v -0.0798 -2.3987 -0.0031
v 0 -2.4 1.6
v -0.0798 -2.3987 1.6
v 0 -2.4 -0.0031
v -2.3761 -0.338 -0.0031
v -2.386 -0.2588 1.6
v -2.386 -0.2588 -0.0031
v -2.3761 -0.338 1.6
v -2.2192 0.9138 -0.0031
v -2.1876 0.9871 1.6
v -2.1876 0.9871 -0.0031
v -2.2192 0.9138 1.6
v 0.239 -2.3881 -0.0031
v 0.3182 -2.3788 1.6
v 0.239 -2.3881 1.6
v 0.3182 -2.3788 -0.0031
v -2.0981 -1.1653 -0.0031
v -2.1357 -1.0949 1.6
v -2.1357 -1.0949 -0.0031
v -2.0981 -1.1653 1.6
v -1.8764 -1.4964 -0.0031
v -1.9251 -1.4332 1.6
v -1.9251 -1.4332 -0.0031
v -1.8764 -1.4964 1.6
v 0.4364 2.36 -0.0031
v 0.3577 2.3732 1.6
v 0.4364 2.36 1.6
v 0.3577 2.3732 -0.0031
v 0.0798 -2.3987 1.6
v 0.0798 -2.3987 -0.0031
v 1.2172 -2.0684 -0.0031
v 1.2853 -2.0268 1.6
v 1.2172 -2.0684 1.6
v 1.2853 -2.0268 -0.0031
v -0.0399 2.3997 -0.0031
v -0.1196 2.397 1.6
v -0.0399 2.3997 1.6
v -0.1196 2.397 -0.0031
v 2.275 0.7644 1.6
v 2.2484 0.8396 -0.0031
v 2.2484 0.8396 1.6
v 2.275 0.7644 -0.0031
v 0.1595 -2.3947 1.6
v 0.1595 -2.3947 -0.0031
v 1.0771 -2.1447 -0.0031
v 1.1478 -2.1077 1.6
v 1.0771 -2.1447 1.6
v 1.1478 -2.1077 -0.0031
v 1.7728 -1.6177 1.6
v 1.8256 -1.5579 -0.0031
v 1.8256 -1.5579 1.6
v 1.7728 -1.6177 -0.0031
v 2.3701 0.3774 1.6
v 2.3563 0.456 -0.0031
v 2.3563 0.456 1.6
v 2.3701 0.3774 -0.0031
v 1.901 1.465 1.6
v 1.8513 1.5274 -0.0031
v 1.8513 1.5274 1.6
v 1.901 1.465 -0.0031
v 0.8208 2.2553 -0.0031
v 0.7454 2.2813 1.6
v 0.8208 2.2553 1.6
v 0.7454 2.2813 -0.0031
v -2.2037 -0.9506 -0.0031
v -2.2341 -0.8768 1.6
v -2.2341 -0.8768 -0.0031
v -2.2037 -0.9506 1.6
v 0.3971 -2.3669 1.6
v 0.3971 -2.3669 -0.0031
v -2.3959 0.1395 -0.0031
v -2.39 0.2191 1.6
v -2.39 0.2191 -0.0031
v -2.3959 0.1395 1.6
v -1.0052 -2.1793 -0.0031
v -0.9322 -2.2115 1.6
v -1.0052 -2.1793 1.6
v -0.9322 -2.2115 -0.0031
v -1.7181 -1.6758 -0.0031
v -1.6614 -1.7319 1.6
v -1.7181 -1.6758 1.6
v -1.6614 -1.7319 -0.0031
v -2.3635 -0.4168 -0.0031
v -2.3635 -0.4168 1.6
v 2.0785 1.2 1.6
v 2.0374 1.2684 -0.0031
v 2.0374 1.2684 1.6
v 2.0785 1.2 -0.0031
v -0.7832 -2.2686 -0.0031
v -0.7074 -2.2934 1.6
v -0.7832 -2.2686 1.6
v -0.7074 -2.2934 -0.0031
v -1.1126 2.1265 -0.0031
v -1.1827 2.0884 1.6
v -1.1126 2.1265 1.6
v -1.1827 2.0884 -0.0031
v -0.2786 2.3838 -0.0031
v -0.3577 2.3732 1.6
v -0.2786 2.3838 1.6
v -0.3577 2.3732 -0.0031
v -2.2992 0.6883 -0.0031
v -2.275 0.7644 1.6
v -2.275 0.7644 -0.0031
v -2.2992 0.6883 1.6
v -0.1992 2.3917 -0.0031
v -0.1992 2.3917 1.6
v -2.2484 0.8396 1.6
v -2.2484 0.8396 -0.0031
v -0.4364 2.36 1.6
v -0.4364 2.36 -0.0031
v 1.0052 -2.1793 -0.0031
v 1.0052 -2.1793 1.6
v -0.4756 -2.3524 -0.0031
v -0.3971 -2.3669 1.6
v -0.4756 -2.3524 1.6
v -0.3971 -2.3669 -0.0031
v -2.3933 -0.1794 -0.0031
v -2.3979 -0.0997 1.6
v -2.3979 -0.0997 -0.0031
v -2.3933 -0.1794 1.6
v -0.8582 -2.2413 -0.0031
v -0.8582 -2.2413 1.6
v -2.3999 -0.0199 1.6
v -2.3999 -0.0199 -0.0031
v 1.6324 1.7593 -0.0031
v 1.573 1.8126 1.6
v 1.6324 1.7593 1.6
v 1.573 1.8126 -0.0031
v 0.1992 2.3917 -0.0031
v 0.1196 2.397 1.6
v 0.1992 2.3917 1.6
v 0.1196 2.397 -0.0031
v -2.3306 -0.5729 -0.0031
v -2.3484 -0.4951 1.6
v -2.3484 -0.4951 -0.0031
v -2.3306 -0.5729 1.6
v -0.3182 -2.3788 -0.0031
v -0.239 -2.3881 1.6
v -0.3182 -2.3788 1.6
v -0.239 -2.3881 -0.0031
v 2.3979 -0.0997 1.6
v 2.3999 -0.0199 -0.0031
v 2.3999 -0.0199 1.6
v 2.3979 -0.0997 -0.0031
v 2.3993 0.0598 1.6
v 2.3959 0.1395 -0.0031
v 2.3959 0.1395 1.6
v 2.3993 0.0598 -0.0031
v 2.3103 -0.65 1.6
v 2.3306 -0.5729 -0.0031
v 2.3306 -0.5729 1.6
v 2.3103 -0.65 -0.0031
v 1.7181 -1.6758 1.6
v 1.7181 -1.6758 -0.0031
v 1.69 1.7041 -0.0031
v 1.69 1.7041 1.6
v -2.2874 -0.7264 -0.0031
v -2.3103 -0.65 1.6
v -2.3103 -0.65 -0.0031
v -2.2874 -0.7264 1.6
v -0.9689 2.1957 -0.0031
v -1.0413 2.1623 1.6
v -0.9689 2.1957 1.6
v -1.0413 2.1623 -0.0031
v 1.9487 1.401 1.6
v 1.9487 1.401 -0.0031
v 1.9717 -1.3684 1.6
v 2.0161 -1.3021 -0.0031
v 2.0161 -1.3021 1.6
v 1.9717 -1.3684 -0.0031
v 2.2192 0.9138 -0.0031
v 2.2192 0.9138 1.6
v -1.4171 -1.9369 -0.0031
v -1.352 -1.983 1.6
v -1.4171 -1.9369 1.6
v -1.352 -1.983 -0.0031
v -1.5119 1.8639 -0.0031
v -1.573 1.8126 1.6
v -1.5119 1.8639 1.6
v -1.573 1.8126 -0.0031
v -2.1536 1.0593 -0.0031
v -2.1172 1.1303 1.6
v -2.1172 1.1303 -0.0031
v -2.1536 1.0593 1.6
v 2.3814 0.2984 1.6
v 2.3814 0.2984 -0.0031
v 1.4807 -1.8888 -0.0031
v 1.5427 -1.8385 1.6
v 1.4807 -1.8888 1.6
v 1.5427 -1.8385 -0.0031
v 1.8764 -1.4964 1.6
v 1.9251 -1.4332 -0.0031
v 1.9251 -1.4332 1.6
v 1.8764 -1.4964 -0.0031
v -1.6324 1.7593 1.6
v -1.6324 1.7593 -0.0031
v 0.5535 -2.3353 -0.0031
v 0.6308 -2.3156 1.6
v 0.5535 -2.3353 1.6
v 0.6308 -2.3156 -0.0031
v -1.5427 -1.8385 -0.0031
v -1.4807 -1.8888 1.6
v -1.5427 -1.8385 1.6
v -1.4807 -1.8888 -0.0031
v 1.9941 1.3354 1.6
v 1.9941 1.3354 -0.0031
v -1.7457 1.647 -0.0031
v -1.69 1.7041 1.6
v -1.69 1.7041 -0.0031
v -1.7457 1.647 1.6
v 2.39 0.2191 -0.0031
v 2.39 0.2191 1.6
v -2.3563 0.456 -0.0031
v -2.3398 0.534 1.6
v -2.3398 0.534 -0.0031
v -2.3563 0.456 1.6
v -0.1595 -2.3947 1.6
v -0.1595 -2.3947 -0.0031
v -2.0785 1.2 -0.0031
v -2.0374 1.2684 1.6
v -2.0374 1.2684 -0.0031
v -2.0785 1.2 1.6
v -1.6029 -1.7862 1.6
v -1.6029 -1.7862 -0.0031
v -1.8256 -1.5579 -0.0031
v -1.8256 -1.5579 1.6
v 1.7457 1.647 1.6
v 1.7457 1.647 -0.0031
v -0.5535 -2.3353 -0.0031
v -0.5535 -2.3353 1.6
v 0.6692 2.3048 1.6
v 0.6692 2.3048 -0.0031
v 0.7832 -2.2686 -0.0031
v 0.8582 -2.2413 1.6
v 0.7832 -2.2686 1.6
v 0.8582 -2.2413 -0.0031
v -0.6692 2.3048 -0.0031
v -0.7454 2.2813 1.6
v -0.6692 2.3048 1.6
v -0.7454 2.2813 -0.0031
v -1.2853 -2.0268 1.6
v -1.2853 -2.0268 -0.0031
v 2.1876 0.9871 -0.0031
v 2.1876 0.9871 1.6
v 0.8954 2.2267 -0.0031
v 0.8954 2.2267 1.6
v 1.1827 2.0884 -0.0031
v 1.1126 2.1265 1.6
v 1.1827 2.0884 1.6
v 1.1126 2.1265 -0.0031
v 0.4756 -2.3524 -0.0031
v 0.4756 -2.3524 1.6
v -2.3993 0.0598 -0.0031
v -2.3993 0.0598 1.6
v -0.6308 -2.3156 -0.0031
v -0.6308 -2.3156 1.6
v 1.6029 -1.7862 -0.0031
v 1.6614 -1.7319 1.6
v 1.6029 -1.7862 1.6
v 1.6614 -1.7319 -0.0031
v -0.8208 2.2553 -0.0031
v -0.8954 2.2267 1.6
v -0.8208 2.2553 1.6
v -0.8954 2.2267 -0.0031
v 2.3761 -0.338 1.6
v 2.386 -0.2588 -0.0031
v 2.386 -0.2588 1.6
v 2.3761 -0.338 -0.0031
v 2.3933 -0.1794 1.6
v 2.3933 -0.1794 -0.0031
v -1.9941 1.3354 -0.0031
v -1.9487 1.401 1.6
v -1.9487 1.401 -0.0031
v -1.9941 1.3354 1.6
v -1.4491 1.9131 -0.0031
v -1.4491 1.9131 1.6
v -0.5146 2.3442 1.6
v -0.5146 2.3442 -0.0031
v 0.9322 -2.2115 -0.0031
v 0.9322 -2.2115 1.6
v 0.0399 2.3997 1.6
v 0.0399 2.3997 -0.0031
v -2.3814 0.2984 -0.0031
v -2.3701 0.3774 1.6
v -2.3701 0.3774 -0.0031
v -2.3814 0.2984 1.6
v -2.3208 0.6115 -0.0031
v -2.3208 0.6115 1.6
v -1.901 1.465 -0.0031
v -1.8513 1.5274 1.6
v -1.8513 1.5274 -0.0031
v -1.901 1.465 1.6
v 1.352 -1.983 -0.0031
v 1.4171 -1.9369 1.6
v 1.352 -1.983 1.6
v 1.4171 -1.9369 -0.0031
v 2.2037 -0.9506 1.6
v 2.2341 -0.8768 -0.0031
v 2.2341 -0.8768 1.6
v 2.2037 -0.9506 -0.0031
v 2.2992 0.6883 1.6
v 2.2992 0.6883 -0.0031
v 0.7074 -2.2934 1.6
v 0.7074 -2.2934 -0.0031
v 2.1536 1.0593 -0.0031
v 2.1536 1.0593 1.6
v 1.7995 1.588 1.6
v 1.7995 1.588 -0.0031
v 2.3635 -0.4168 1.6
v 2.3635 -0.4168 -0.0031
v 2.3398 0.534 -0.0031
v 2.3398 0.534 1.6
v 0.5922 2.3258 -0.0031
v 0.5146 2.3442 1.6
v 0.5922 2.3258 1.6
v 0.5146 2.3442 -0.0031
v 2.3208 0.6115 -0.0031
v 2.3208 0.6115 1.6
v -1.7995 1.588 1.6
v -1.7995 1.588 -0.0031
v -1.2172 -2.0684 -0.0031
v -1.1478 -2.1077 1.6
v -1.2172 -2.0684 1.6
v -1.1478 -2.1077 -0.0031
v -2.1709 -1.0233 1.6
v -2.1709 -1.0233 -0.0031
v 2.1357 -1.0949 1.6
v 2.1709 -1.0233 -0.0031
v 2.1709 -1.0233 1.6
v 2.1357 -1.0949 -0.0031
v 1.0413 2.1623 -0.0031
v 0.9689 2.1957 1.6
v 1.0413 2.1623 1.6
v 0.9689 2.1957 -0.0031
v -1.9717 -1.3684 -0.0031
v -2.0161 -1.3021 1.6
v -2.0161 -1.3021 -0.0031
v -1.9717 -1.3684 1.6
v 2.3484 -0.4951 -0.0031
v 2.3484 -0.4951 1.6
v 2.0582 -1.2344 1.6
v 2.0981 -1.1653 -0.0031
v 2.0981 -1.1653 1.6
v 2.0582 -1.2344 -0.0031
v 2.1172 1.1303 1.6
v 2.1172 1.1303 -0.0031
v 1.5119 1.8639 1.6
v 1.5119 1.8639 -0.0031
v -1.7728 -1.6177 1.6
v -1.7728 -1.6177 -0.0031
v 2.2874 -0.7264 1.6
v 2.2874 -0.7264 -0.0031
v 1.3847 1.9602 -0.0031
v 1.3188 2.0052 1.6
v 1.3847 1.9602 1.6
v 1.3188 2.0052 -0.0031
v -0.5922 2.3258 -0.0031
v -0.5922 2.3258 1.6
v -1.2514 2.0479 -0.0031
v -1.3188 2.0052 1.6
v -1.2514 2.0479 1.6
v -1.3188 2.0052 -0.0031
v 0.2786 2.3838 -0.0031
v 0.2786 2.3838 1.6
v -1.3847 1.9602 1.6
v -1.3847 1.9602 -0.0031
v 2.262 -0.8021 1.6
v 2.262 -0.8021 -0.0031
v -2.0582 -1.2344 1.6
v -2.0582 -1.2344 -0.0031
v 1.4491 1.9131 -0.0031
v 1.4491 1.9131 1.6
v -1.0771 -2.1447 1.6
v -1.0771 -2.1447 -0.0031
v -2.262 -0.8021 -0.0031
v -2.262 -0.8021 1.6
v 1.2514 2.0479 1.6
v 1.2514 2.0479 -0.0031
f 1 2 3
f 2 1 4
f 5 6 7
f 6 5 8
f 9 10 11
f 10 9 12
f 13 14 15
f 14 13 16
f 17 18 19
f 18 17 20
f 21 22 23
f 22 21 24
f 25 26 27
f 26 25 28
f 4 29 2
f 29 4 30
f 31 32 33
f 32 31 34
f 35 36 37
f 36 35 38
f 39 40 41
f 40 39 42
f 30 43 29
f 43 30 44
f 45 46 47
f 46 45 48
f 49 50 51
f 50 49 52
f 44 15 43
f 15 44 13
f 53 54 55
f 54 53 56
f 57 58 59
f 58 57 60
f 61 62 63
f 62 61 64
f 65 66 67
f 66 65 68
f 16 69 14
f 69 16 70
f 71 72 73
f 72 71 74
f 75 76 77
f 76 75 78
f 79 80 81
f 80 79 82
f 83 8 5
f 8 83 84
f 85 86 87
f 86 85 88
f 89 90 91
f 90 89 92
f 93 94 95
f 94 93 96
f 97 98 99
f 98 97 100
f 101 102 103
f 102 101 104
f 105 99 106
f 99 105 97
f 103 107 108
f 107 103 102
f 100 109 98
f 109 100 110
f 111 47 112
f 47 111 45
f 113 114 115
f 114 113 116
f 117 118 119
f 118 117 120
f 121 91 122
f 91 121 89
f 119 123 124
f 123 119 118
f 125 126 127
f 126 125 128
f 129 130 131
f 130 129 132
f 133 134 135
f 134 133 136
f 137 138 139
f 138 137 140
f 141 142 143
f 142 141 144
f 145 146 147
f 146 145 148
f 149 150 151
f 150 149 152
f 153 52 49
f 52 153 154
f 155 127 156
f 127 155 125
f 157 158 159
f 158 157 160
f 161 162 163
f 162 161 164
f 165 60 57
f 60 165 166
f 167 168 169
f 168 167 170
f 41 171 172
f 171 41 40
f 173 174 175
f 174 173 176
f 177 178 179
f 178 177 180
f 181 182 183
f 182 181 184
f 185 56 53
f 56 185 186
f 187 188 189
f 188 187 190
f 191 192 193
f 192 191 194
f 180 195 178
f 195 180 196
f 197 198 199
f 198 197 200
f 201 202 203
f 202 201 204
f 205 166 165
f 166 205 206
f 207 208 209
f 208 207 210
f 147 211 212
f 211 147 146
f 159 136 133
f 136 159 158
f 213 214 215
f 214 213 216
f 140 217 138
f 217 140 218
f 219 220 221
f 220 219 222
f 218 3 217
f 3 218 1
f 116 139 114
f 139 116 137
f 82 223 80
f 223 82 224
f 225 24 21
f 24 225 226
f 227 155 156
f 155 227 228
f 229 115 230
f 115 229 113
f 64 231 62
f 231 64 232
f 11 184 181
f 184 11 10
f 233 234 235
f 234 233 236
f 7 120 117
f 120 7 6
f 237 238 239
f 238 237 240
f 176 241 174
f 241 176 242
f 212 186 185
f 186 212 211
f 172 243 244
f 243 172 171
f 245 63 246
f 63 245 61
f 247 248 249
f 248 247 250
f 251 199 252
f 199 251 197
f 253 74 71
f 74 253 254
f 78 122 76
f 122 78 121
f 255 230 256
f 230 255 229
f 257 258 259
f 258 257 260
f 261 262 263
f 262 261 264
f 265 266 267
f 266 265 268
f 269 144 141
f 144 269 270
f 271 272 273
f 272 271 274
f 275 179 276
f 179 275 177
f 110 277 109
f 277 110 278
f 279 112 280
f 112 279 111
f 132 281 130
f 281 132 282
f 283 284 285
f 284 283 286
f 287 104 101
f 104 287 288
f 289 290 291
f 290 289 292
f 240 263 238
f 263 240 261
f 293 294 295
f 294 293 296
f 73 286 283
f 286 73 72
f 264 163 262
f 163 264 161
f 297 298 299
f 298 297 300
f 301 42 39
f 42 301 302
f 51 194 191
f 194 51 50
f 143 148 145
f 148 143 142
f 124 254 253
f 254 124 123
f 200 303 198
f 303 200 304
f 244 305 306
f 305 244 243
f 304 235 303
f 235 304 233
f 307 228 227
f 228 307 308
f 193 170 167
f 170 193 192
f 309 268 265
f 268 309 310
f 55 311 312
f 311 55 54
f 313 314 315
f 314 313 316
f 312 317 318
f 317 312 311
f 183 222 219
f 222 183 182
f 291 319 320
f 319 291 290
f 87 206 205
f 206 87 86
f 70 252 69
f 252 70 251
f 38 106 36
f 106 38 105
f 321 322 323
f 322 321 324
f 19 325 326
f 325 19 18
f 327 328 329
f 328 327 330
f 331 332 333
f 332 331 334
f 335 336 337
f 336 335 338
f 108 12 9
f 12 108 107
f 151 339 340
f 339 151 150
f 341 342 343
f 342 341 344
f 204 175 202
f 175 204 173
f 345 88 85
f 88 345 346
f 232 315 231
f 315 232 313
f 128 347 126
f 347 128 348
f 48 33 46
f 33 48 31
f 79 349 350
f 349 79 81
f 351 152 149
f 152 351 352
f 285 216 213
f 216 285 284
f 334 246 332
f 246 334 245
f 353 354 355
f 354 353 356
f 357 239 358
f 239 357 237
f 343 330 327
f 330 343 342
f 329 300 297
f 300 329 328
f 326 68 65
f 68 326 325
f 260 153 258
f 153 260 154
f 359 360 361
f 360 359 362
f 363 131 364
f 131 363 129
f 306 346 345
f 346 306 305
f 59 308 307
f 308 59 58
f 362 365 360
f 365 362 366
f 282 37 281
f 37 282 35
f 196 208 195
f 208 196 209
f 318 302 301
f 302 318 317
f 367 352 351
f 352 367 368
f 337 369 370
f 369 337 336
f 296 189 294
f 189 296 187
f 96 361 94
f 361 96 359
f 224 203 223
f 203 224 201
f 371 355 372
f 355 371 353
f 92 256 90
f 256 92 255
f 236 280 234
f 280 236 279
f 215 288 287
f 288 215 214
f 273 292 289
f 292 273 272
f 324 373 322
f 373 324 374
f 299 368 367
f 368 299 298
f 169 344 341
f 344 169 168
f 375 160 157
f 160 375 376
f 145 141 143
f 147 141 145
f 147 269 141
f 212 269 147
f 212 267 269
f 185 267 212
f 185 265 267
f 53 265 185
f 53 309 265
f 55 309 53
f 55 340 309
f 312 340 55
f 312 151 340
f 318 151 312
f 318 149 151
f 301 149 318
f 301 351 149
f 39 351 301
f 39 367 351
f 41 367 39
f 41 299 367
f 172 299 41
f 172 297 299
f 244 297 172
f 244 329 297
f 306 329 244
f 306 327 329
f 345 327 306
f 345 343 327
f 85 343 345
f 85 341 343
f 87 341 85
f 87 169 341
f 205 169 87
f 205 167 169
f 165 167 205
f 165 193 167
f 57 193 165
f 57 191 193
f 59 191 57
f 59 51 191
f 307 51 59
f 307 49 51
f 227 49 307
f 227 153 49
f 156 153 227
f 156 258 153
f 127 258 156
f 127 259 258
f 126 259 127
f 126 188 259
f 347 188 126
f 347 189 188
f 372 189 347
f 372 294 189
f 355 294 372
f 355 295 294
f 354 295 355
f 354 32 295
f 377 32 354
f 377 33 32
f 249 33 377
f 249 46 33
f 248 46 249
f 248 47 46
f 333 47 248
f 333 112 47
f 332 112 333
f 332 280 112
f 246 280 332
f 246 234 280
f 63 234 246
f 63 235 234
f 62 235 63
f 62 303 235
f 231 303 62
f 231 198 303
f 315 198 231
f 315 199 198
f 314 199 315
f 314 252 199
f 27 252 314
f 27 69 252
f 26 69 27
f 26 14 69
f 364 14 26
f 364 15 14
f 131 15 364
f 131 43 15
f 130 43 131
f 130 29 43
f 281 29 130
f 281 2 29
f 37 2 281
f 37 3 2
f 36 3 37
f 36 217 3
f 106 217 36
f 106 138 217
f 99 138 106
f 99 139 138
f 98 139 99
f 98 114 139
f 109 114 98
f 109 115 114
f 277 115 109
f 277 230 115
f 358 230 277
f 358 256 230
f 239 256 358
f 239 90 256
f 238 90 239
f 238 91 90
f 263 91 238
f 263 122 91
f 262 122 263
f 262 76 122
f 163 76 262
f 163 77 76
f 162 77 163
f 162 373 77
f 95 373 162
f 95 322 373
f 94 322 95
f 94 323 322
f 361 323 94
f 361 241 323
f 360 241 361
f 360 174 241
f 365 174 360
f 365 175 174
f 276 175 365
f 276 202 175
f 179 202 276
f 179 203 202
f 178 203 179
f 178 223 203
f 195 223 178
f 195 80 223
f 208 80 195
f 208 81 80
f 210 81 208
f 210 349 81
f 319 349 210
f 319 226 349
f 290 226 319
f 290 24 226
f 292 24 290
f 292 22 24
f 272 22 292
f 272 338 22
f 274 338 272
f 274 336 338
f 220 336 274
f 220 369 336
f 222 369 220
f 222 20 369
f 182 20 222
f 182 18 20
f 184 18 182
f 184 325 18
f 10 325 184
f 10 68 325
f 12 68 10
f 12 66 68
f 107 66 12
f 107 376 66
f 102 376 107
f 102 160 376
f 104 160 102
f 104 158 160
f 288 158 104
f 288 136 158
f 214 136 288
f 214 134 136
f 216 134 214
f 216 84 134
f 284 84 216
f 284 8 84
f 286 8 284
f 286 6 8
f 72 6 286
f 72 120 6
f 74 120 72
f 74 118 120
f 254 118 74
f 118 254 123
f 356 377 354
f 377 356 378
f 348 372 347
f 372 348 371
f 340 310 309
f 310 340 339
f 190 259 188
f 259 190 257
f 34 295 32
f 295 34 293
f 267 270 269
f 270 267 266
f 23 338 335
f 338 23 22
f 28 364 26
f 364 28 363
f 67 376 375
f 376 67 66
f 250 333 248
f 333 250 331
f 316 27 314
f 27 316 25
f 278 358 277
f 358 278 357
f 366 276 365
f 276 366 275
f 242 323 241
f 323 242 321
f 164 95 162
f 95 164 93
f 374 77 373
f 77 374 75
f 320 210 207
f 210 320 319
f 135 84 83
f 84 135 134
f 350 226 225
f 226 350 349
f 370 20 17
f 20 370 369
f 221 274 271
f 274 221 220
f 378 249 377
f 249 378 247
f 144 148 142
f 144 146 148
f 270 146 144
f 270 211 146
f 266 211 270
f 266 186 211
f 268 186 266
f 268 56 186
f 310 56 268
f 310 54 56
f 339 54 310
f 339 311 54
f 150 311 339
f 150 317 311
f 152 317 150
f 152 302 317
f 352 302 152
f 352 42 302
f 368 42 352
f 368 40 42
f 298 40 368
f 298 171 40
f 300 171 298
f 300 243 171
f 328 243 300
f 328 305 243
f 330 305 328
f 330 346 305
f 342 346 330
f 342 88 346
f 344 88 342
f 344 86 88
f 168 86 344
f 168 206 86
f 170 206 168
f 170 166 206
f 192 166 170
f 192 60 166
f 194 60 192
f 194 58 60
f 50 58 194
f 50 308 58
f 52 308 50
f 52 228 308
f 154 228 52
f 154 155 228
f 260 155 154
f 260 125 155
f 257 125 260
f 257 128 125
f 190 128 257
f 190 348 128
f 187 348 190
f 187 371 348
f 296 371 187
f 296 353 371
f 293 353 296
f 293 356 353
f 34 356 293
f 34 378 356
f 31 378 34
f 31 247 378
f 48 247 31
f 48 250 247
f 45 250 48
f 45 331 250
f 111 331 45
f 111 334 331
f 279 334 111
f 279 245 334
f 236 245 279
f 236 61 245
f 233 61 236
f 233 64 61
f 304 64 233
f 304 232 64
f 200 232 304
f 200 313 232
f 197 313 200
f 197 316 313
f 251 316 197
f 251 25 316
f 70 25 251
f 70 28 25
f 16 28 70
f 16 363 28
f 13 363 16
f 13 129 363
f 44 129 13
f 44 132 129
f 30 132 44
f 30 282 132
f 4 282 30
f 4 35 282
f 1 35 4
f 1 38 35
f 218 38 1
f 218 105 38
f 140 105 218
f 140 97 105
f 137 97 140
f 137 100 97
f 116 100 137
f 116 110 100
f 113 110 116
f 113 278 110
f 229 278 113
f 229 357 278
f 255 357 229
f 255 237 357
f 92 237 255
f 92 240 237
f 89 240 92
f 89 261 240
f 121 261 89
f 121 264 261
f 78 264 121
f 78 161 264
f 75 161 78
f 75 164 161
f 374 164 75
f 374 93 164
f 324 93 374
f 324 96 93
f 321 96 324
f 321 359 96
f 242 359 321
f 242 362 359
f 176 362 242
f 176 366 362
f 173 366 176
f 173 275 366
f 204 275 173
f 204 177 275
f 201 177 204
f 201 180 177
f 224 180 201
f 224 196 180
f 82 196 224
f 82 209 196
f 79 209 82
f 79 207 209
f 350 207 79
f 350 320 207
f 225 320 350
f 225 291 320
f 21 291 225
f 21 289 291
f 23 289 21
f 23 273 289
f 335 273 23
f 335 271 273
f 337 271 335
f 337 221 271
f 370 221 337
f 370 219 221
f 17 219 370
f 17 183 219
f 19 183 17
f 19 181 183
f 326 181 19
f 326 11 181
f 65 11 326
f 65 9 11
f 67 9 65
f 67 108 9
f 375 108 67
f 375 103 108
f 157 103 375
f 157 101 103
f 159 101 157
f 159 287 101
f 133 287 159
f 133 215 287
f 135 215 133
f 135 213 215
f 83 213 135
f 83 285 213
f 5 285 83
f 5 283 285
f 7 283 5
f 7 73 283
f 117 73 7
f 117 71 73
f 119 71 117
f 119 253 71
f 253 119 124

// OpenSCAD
use <../lib.scad>
use <s/3960pb4s01.scad>
use <s/3960s01.scad>
use <s/3960s05.scad>
$fa=1; $fs=0.2;
function ldraw_lib__3960pb4(realsolid=false) = [
// 0 Dish  4 x  4 Inverted with Inverted Yellow Concentric Lines (Sinestro) Pattern
// 0 Name: 3960pb4.dat
// 0 Author: Gerald Lasser [GeraldLasser]
// 0 !LDRAW_ORG Part UPDATE 2019-03
// 0 !LICENSE Licensed under CC BY 2.0 and CC BY 4.0 : see CAreadme.txt
// 
// 0 BFC CERTIFY CCW
  [0,"BFC","CERTIFY"],
  [0,"BFC","CCW"],
// 
// 0 !KEYWORDS Bricklink 3960pb030, Set 76025
// 
// 0 !HISTORY 2019-12-27 [PTadmin] Official Update 2019-03
// 
// 
// 1 16 0 0 0 1 0 0 0 1 0 0 0 1 s\3960s01.dat
  [1,16,0,0,0,1,0,0,0,1,0,0,0,1, ldraw_lib__s__3960s01(realsolid)],
// 
// 1 16 0 0 0 1 0 0 0 1 0 0 0 1 s\3960pb4s01.dat
  [1,16,0,0,0,1,0,0,0,1,0,0,0,1, ldraw_lib__s__3960pb4s01(realsolid)],
// 1 16 0 0 0 -1 0 0 0 1 0 0 0 1 s\3960pb4s01.dat
  [1,16,0,0,0,-1,0,0,0,1,0,0,0,1, ldraw_lib__s__3960pb4s01(realsolid)],
// 
// 1 16 0 0 0 1 0 0 0 1 0 0 0 1 s\3960s05.dat
  [1,16,0,0,0,1,0,0,0,1,0,0,0,1, ldraw_lib__s__3960s05(realsolid)],
];
module ldraw_lib__3960pb4(step=0, col=false, unit=2/5, alt=false, line=0.2, solid=!$preview)
    makepoly(ldraw_lib__3960pb4(solid), step=step, col=col, unit=unit, alt=alt, line=line, solid=solid);
ldraw_lib__3960pb4(line=0.2);
